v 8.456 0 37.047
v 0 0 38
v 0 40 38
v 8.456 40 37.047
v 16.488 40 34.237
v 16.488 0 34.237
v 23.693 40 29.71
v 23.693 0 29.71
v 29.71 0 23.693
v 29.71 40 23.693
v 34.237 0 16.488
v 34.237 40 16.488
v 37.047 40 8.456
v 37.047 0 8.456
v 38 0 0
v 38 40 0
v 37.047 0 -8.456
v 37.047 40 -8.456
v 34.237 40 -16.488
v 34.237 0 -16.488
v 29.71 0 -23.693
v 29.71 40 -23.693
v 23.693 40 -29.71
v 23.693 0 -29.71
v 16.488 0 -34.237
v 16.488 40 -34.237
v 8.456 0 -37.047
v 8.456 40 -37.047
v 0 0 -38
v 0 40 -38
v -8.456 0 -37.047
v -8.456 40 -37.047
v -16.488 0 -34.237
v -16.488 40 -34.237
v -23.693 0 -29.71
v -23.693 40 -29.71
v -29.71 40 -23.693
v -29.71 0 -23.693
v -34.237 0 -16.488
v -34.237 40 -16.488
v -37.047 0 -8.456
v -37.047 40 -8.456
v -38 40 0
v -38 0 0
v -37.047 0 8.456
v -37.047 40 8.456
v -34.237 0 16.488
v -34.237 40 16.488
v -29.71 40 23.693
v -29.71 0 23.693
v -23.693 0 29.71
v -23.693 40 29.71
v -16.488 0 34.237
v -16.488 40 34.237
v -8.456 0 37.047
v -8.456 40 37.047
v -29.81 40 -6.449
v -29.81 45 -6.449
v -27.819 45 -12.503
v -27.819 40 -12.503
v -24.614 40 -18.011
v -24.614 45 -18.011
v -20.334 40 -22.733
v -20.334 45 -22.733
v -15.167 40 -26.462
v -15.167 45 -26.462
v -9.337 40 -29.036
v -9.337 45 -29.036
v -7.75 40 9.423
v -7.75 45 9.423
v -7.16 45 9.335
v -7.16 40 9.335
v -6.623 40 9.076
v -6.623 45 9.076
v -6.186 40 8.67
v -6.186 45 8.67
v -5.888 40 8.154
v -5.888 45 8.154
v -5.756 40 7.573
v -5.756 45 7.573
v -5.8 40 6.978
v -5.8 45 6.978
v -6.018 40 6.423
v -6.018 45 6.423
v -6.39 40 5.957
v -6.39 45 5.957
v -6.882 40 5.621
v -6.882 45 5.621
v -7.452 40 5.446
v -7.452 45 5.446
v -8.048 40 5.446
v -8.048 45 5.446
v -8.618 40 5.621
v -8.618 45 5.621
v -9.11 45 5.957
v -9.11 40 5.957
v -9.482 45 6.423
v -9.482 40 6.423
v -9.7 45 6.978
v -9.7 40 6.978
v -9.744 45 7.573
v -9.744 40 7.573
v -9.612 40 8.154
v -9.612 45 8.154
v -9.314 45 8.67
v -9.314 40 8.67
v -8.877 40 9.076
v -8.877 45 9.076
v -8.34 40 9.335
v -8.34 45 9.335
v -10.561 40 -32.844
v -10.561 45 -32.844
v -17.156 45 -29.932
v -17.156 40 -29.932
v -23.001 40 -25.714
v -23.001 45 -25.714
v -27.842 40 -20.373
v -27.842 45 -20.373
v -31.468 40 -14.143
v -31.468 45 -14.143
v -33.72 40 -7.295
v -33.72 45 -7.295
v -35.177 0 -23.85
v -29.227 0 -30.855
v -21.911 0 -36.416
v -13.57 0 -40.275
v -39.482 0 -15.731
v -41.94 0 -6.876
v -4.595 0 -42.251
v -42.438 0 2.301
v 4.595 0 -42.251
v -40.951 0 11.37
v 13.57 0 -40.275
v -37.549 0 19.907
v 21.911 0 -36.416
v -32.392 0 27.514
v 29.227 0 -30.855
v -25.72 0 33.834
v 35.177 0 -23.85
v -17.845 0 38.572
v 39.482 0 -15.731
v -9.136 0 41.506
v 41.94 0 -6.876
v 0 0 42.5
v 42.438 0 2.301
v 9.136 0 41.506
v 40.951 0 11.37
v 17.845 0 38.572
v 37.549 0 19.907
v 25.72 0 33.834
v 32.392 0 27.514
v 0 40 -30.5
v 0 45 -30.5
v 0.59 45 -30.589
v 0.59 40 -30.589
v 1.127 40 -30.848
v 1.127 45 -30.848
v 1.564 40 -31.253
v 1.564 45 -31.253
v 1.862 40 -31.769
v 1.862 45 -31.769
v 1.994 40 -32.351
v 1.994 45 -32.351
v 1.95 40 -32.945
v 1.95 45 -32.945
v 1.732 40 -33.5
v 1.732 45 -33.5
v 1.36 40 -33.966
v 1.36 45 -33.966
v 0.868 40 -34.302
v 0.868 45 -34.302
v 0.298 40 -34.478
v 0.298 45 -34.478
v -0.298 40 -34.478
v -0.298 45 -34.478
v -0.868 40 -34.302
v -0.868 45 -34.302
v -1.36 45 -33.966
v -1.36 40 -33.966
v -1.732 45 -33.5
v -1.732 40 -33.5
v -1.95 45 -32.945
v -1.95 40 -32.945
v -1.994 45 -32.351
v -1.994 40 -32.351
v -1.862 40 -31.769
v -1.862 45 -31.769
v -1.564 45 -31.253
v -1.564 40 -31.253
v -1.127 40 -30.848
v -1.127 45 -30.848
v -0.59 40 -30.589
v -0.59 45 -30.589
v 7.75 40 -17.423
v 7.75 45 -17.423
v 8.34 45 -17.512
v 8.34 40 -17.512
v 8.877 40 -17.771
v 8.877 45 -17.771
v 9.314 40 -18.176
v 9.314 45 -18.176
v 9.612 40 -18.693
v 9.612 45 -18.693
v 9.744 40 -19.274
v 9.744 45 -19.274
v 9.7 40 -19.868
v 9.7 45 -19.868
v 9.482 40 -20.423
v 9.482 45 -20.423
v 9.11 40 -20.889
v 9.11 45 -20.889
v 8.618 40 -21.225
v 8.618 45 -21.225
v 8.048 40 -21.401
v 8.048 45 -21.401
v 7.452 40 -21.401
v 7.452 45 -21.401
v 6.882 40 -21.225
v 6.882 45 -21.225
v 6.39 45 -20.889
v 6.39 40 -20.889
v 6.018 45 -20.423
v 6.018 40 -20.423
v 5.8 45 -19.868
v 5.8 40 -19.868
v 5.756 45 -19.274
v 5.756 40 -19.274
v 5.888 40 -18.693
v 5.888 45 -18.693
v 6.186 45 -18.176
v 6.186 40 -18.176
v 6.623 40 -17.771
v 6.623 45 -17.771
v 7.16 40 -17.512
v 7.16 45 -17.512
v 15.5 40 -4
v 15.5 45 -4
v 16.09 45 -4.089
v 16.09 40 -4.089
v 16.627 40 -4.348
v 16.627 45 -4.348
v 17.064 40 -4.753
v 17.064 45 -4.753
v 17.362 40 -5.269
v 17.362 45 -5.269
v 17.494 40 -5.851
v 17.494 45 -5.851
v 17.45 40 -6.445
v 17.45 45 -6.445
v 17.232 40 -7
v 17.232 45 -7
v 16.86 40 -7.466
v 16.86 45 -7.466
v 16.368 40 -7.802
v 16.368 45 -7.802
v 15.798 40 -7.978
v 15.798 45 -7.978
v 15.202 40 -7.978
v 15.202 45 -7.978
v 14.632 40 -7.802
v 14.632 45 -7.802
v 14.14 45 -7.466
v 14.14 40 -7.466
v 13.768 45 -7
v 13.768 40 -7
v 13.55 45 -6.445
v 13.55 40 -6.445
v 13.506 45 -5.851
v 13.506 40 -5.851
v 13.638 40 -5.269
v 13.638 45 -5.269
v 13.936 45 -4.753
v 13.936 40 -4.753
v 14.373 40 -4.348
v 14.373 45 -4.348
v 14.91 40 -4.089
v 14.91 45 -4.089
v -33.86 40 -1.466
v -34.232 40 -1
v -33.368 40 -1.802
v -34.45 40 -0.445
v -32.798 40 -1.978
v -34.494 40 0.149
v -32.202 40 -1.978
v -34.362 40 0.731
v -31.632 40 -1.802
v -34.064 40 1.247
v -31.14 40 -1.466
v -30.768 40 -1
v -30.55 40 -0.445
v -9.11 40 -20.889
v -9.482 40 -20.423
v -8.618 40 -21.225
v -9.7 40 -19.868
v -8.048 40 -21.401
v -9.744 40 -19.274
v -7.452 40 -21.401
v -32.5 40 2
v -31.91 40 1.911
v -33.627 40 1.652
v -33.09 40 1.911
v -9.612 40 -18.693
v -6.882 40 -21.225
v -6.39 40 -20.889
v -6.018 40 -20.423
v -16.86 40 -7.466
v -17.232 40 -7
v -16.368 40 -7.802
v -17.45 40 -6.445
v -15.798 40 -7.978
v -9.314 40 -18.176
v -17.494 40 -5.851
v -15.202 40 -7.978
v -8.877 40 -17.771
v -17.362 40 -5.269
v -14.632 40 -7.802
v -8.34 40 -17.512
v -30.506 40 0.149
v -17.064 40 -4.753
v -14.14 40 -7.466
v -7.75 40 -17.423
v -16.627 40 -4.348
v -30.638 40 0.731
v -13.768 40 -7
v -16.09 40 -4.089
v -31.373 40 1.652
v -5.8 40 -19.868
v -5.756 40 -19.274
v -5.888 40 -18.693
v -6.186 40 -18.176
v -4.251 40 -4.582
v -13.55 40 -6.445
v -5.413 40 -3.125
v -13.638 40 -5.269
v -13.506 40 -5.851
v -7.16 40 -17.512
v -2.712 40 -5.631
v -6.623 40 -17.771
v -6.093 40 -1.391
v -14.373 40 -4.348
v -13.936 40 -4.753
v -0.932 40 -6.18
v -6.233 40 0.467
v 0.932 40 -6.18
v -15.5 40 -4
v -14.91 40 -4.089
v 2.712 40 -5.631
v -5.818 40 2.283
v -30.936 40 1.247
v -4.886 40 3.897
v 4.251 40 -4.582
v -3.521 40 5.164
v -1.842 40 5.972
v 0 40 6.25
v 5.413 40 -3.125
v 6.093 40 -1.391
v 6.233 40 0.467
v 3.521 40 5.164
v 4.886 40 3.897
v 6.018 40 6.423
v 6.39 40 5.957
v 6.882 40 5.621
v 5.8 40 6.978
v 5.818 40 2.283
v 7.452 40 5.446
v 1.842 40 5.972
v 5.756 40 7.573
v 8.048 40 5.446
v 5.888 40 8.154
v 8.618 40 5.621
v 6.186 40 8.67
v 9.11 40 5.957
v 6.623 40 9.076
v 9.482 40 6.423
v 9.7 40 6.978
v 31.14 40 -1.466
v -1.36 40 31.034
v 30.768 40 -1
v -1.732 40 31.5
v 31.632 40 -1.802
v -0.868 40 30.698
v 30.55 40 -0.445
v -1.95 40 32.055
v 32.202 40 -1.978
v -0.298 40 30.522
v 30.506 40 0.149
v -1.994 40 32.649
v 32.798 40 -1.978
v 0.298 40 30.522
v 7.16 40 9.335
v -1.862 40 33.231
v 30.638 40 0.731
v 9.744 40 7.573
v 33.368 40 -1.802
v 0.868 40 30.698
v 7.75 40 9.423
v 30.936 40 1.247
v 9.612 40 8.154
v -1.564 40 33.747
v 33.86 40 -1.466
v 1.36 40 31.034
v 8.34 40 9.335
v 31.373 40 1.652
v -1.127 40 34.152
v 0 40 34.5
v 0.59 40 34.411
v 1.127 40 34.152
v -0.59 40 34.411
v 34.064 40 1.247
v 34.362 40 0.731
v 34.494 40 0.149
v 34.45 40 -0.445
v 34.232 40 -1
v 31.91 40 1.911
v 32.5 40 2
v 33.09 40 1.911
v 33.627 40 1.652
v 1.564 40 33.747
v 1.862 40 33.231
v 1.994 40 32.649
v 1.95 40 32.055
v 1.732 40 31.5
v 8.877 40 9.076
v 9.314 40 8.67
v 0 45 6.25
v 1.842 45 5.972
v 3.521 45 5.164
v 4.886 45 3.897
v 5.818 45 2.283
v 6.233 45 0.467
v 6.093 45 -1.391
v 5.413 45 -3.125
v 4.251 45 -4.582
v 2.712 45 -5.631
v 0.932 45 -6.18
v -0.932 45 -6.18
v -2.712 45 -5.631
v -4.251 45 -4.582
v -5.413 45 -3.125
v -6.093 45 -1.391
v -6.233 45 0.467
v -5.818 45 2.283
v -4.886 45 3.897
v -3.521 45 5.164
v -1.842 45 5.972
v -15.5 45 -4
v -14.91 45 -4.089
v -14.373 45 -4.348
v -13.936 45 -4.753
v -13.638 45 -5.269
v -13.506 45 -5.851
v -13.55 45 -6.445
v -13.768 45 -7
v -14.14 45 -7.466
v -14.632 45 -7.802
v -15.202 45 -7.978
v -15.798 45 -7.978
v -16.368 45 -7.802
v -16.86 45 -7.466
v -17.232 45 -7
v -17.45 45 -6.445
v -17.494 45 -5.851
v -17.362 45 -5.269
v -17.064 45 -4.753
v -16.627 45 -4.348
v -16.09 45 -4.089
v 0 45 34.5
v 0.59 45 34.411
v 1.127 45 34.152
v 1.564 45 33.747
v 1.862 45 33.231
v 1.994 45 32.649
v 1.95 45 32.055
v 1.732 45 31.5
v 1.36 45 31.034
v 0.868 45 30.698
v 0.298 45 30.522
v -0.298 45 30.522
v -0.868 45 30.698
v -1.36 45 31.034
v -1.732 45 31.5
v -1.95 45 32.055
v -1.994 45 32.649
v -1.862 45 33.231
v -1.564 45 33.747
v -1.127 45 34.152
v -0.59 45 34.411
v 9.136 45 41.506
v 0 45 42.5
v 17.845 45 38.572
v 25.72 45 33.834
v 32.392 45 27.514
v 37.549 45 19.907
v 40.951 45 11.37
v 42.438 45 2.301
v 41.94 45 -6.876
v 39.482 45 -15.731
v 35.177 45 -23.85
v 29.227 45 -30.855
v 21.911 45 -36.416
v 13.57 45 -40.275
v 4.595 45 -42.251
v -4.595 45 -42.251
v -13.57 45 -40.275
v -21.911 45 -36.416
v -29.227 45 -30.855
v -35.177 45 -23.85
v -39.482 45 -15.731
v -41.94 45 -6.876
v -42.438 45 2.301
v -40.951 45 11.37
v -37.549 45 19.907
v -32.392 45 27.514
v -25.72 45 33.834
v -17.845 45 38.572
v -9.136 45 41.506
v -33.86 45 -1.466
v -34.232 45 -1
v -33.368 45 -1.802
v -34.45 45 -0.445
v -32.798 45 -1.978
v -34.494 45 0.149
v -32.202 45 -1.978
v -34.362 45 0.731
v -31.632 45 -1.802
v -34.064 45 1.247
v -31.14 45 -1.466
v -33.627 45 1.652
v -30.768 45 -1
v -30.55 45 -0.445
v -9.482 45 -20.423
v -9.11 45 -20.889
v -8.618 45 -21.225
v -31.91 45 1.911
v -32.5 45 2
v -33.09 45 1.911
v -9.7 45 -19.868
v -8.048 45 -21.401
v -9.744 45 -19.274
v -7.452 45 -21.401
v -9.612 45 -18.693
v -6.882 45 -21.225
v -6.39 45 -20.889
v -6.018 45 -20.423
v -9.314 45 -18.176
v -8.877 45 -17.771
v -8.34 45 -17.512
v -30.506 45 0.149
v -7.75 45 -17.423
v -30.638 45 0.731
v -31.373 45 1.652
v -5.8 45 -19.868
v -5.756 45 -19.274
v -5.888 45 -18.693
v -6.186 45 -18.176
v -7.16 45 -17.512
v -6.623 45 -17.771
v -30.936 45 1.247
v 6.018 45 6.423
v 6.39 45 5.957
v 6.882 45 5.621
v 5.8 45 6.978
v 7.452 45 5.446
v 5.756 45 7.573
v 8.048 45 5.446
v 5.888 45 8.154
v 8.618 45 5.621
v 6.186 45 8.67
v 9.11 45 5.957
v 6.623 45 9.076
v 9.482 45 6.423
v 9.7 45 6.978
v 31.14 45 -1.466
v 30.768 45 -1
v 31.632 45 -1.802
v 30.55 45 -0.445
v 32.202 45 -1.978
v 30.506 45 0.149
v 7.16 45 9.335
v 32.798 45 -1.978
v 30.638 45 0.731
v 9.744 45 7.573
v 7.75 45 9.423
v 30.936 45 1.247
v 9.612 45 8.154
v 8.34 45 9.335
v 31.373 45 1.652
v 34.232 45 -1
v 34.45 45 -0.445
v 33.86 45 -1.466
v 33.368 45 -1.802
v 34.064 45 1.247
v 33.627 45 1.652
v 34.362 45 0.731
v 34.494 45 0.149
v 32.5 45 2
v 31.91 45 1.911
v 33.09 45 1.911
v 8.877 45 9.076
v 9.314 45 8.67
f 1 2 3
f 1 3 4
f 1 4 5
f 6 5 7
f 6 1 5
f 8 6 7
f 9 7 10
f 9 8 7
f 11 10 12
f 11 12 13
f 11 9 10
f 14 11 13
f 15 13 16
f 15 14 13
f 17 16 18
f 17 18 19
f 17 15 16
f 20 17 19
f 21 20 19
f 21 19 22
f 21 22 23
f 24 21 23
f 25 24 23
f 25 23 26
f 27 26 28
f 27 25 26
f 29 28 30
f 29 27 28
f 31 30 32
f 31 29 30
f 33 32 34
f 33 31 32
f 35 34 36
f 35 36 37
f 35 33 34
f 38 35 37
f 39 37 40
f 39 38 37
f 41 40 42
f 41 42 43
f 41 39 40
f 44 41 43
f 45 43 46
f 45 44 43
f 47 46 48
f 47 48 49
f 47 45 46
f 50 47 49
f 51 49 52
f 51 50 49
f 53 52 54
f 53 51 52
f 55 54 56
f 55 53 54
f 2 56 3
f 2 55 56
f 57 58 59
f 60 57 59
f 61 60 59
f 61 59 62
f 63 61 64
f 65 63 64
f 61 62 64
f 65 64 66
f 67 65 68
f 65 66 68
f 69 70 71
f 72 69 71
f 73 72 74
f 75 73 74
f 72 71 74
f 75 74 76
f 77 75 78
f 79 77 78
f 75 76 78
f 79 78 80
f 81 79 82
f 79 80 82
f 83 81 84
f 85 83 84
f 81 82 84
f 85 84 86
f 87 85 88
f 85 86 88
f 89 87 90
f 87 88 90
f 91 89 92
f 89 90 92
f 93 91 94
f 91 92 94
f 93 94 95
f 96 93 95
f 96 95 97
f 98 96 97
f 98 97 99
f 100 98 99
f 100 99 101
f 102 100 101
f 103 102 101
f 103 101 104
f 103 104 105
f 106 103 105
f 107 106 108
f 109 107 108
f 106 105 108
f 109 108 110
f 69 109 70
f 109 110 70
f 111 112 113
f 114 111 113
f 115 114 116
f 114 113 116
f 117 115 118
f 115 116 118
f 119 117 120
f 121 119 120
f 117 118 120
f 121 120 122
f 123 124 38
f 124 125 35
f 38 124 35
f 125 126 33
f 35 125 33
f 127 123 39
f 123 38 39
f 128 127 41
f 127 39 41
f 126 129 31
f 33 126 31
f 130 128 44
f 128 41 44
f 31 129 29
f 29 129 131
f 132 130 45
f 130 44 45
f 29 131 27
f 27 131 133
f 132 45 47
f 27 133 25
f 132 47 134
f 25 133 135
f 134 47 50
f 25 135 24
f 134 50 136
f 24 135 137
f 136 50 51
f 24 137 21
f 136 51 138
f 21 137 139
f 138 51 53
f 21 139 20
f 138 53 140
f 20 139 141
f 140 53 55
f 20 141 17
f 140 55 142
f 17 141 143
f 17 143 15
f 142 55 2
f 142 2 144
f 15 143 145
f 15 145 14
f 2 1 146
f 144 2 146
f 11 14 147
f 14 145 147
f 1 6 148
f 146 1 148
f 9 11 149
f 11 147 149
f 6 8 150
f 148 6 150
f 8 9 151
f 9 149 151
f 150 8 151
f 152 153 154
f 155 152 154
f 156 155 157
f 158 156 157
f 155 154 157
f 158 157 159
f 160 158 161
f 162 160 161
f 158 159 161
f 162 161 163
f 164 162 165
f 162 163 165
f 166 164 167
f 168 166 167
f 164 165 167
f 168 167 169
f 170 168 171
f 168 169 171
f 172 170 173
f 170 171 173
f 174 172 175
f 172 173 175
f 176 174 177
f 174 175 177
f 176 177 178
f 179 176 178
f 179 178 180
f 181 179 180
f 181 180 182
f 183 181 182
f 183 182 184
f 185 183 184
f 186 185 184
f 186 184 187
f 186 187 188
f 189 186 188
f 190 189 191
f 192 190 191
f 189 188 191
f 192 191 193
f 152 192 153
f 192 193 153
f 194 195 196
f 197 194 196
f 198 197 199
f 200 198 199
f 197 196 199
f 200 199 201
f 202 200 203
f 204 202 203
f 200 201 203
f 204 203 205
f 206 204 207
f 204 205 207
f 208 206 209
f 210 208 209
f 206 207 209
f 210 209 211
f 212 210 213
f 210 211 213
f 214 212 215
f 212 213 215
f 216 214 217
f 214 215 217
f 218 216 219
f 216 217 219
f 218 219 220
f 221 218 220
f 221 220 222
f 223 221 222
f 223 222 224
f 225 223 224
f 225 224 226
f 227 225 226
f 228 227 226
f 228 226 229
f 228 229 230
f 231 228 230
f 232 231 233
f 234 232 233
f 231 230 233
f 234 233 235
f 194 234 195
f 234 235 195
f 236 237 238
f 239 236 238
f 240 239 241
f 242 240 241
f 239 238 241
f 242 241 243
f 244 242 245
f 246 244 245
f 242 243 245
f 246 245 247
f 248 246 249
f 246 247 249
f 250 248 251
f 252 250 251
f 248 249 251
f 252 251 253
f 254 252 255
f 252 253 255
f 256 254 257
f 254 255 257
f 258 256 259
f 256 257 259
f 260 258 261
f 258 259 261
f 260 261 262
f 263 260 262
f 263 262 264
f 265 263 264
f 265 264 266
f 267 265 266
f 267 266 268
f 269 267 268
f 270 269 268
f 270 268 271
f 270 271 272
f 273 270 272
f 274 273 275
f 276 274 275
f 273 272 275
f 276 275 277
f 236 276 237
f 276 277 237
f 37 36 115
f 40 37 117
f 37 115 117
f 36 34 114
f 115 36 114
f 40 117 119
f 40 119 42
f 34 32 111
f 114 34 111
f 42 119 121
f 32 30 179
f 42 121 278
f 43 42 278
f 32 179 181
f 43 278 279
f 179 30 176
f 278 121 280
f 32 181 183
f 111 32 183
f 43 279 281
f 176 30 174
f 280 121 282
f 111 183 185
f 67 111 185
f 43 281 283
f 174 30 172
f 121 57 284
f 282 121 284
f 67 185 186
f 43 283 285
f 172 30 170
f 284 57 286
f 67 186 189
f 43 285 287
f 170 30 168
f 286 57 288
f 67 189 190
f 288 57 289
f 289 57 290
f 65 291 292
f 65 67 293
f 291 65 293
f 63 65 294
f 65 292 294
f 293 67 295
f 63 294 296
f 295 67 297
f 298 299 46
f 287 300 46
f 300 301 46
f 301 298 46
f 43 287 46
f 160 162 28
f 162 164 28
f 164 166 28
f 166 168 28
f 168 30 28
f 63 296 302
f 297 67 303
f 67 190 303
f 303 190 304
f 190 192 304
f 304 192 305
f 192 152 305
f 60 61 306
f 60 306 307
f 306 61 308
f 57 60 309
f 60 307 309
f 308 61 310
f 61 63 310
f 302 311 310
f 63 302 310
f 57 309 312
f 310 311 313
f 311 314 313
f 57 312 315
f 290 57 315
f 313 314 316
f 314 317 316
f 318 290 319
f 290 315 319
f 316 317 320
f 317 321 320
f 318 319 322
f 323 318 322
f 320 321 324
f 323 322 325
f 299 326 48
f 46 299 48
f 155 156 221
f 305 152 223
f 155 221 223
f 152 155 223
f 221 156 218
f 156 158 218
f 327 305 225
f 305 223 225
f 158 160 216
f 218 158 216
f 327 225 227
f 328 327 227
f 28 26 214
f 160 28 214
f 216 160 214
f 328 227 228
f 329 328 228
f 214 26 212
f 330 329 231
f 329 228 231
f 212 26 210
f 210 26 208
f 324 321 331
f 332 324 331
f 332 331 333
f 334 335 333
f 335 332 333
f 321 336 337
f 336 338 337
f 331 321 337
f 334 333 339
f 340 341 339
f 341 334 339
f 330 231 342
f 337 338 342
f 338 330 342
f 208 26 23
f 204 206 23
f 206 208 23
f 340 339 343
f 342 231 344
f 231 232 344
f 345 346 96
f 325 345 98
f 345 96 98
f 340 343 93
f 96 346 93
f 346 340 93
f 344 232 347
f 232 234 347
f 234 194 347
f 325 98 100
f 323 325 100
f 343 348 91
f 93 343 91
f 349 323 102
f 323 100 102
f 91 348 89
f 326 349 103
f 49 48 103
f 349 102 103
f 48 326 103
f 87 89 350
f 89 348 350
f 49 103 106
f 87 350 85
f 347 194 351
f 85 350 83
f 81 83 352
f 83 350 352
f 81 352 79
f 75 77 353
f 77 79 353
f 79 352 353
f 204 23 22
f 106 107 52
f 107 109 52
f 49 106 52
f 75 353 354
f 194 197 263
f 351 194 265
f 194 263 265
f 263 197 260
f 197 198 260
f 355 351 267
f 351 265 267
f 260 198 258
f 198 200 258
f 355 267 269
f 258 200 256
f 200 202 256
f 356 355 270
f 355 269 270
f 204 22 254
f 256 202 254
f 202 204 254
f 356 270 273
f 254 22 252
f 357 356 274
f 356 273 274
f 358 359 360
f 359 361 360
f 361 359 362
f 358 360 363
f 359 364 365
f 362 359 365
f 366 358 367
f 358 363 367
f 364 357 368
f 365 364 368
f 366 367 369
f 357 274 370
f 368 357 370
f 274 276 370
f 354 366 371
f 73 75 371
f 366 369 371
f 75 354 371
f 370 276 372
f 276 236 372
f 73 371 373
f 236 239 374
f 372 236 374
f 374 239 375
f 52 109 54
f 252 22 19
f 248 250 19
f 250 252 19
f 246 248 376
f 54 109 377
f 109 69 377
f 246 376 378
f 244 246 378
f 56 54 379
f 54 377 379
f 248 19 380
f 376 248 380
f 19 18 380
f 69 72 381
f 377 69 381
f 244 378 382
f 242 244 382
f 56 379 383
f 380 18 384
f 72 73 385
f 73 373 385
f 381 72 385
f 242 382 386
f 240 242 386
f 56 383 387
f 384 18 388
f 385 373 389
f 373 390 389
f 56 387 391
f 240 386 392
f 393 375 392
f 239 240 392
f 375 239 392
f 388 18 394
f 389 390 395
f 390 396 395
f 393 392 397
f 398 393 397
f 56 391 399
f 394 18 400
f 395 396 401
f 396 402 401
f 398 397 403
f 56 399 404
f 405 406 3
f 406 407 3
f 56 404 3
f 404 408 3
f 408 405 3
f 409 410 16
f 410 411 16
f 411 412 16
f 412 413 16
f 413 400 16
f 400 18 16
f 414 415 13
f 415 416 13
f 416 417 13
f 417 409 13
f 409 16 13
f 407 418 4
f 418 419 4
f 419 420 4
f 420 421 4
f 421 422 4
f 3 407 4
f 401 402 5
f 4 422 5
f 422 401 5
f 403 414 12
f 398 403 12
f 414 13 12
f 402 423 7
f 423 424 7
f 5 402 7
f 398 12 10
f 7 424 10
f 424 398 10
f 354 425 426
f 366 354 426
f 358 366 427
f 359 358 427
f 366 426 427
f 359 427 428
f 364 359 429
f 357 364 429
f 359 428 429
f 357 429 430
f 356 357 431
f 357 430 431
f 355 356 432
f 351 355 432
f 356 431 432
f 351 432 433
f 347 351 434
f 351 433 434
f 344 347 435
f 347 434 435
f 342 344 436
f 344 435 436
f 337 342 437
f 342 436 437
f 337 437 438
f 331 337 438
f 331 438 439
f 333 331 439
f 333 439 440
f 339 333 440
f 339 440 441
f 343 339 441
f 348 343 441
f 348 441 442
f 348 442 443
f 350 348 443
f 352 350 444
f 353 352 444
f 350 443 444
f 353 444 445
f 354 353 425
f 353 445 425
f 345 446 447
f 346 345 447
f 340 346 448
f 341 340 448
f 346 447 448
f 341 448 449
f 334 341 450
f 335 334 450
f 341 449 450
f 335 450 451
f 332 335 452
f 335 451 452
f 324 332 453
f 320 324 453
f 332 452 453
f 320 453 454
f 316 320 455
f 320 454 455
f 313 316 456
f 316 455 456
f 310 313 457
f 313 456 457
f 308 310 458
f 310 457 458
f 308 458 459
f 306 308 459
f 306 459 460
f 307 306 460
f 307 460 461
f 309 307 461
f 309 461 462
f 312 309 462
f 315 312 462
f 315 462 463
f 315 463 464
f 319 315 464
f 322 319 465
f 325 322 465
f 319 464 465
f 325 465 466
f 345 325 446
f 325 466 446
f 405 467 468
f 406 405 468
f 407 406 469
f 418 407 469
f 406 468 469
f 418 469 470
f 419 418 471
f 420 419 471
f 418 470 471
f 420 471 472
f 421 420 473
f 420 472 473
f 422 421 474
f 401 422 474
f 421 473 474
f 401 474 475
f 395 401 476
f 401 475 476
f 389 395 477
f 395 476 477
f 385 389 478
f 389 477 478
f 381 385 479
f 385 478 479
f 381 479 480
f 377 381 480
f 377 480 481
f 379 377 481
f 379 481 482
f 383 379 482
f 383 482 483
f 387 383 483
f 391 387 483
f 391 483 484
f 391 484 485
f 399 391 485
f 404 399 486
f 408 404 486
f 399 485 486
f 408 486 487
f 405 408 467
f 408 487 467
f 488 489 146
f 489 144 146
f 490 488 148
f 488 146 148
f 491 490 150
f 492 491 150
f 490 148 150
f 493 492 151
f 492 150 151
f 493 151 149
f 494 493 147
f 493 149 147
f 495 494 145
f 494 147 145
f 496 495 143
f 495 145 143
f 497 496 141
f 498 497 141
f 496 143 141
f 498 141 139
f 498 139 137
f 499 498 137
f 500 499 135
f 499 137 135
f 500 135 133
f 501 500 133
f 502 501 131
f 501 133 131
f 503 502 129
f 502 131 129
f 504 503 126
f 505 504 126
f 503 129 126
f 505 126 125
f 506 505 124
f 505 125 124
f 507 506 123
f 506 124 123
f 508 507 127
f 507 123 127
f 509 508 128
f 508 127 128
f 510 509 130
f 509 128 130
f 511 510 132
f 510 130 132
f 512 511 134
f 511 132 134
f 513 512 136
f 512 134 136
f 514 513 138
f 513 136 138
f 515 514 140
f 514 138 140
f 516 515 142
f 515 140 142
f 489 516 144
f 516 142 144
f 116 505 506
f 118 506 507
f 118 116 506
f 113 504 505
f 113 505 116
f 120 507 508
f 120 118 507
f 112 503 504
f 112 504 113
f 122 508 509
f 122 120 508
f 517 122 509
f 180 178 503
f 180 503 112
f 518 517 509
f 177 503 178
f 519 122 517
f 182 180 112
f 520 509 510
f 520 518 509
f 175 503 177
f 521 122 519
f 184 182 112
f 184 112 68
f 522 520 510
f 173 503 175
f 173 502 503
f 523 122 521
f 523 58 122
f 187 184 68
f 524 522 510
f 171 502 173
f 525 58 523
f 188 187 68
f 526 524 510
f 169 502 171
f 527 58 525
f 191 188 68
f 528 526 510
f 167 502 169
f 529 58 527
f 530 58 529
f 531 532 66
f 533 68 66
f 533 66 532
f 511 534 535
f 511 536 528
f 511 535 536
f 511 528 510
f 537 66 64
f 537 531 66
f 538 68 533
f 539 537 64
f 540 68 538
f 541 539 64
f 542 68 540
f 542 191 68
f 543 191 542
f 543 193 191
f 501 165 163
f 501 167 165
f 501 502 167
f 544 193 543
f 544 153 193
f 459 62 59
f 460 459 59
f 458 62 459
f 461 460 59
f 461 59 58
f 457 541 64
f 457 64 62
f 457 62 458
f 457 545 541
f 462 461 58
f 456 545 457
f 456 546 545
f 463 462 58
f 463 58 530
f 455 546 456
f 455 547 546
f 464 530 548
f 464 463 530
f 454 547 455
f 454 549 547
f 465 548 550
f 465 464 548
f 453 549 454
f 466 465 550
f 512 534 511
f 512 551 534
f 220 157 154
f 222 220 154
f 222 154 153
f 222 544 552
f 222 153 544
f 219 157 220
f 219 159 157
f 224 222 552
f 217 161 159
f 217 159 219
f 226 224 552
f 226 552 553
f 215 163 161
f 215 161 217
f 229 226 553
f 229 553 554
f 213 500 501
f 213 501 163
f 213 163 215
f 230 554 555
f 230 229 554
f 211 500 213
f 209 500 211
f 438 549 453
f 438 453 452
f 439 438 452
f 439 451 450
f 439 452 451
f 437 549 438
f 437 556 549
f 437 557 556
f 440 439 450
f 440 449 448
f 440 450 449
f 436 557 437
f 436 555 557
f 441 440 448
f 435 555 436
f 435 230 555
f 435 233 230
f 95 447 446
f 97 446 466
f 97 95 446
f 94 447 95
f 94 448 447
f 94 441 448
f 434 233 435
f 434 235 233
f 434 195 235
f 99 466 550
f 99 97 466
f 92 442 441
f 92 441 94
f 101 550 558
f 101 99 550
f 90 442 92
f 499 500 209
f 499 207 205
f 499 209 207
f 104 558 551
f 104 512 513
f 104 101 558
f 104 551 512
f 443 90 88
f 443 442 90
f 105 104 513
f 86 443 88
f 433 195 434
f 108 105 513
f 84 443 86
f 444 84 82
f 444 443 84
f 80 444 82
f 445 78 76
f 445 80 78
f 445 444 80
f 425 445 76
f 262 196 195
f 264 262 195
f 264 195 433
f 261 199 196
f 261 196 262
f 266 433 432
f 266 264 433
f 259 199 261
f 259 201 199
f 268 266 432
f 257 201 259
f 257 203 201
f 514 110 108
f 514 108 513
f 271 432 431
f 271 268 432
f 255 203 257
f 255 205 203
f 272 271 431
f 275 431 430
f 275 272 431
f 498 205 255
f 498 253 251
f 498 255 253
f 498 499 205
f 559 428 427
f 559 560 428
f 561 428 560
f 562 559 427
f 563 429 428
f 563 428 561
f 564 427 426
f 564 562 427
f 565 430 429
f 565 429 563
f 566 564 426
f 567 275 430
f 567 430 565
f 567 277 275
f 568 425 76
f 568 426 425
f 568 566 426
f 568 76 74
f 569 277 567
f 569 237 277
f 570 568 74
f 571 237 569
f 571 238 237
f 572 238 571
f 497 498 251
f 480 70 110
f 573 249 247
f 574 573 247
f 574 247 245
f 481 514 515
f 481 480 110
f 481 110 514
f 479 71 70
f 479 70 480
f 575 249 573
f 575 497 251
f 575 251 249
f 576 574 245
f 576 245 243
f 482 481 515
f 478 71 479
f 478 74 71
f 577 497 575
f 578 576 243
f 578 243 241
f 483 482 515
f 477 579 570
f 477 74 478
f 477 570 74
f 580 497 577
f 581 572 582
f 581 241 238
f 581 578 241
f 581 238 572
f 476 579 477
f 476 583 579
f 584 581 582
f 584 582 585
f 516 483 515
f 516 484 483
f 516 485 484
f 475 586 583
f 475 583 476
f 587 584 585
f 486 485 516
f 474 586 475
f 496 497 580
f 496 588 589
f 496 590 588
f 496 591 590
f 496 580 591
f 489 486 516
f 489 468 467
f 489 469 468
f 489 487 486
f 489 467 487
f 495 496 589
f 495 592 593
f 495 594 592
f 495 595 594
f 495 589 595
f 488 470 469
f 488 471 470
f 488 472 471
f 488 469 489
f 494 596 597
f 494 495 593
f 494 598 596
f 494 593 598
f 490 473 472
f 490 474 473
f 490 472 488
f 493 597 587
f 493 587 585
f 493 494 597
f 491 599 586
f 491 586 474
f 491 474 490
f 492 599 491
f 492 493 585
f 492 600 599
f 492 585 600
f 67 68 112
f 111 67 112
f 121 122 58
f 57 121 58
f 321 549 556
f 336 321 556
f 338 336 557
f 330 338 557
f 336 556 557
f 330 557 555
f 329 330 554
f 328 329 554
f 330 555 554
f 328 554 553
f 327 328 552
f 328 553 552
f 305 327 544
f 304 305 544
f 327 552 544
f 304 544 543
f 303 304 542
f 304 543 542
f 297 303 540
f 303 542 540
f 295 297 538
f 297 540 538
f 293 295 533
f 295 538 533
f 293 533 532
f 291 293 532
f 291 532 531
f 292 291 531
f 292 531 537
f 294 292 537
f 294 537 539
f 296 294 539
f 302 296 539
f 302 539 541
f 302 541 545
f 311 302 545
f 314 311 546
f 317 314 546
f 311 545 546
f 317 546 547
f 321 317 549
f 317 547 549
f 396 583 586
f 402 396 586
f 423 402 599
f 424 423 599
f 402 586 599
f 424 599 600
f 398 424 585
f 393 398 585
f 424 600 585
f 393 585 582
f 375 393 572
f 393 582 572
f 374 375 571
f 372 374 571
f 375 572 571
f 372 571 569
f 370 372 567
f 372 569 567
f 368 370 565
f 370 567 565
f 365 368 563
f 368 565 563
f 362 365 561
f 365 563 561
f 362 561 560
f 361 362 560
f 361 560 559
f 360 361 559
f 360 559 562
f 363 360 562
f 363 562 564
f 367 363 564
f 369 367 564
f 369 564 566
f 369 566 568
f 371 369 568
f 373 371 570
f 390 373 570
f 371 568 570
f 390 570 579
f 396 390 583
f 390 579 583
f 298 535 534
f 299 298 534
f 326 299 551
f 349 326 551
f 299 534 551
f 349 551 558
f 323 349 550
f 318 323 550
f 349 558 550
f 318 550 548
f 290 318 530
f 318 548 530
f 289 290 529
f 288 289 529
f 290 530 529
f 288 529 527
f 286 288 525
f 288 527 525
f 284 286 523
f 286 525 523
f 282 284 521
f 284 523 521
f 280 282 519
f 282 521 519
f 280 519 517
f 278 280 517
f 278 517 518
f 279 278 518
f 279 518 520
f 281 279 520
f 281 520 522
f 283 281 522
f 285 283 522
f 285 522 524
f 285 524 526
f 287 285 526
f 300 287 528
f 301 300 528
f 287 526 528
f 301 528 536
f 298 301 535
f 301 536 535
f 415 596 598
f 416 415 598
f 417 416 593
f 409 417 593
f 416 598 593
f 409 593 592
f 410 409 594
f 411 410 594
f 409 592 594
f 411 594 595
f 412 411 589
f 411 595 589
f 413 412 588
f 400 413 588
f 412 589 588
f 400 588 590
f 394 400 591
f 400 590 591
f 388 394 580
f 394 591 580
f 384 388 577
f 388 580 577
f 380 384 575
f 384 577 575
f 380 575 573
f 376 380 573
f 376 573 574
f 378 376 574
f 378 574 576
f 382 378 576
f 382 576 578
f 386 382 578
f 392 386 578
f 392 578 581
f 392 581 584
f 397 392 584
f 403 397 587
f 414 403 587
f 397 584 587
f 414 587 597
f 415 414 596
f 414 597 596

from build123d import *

# Parameters (mm, degrees)
IZIM6_R                     = 42.5
IZIM6_R_2                   = 38
Y_KSEKLIK_EKSTR_ZYON1_DEPTH = 40
IZIM7_R                     = 42.5
Y_KSEKLIK_EKSTR_ZYON2_DEPTH = 5
IZIM8_R                     = 2
IZIM8_R_2                   = 6.25
KES_EKSTR_ZYON2_DEPTH       = 5
KES_EKSTR_ZYON4_DEPTH       = 5


with BuildPart() as part:
    # Çizim6 → Yükseklik-Ekstrüzyon1 (new body)
    with BuildSketch(Plane(origin=(0, 0, 0), x_dir=(1, 0, 0), z_dir=(0, 1, 0))):
        with Locations(Location((0, 0, 0), (0, 0, 270))):
            Circle(IZIM6_R)
        with Locations(Location((0, 0, 0), (0, 0, 270))):
            Circle(IZIM6_R_2, mode=Mode.SUBTRACT)
    extrude(amount=Y_KSEKLIK_EKSTR_ZYON1_DEPTH)

    # Çizim7 → Yükseklik-Ekstrüzyon2 (add)
    with BuildSketch(Plane(origin=(0, 40, 0), x_dir=(1, 0, 0), z_dir=(0, 1, 0))):
        with Locations(Location((0, 0, 0), (0, 0, 270))):
            Circle(IZIM7_R)
    extrude(amount=Y_KSEKLIK_EKSTR_ZYON2_DEPTH)

    # Çizim8 → Kes-Ekstrüzyon2 (cut)
    with BuildSketch(Plane(origin=(0, 45, 0), x_dir=(1, 0, 0), z_dir=(0, 1, 0))):
        with Locations(Location((0, 32.5, 0), (0, 0, 270))):
            Circle(IZIM8_R)
        with Locations(Location((-32.5, 0, 0), (0, 0, 270))):
            Circle(IZIM8_R)
        with Locations(Location((32.5, 0, 0), (0, 0, 270))):
            Circle(IZIM8_R)
        with Locations(Location((0, -32.5, 0), (0, 0, 270))):
            Circle(IZIM8_R)
        with Locations(Location((0, 0, 0), (0, 0, 270))):
            Circle(IZIM8_R_2)
        with Locations(Location((-15.5, 6, 0), (0, 0, 270))):
            Circle(IZIM8_R)
        with Locations(Location((-7.75, 19.423393759, 0), (0, 0, 270))):
            Circle(IZIM8_R)
        with Locations(Location((7.75, 19.423393759, 0), (0, 0, 270))):
            Circle(IZIM8_R)
        with Locations(Location((15.5, 6, 0), (0, 0, 270))):
            Circle(IZIM8_R)
        with Locations(Location((7.75, -7.423393759, 0), (0, 0, 270))):
            Circle(IZIM8_R)
        with Locations(Location((-7.75, -7.423393759, 0), (0, 0, 270))):
            Circle(IZIM8_R)
    extrude(amount=-KES_EKSTR_ZYON2_DEPTH, mode=Mode.SUBTRACT)

    # Çizim11 → Kes-Ekstrüzyon4 (cut)
    with BuildSketch(Plane(origin=(0, 45, 0), x_dir=(1, 0, 0), z_dir=(0, 1, 0))):
        with BuildLine():
            Line((-33.71988341, 7.295167084), (-29.810331711, 6.44935061))
            ThreePointArc((-29.810331711, 6.44935061), (-22.597803721, 20.483878221), (-9.336800782, 29.035739205))
            Line((-9.336800782, 29.035739205), (-10.561299245, 32.843705002))
            ThreePointArc((-10.561299245, 32.843705002), (-25.561450111, 23.170288479), (-33.71988341, 7.295167084))
        make_face()
    extrude(amount=-KES_EKSTR_ZYON4_DEPTH, mode=Mode.SUBTRACT)


solid = part.part
